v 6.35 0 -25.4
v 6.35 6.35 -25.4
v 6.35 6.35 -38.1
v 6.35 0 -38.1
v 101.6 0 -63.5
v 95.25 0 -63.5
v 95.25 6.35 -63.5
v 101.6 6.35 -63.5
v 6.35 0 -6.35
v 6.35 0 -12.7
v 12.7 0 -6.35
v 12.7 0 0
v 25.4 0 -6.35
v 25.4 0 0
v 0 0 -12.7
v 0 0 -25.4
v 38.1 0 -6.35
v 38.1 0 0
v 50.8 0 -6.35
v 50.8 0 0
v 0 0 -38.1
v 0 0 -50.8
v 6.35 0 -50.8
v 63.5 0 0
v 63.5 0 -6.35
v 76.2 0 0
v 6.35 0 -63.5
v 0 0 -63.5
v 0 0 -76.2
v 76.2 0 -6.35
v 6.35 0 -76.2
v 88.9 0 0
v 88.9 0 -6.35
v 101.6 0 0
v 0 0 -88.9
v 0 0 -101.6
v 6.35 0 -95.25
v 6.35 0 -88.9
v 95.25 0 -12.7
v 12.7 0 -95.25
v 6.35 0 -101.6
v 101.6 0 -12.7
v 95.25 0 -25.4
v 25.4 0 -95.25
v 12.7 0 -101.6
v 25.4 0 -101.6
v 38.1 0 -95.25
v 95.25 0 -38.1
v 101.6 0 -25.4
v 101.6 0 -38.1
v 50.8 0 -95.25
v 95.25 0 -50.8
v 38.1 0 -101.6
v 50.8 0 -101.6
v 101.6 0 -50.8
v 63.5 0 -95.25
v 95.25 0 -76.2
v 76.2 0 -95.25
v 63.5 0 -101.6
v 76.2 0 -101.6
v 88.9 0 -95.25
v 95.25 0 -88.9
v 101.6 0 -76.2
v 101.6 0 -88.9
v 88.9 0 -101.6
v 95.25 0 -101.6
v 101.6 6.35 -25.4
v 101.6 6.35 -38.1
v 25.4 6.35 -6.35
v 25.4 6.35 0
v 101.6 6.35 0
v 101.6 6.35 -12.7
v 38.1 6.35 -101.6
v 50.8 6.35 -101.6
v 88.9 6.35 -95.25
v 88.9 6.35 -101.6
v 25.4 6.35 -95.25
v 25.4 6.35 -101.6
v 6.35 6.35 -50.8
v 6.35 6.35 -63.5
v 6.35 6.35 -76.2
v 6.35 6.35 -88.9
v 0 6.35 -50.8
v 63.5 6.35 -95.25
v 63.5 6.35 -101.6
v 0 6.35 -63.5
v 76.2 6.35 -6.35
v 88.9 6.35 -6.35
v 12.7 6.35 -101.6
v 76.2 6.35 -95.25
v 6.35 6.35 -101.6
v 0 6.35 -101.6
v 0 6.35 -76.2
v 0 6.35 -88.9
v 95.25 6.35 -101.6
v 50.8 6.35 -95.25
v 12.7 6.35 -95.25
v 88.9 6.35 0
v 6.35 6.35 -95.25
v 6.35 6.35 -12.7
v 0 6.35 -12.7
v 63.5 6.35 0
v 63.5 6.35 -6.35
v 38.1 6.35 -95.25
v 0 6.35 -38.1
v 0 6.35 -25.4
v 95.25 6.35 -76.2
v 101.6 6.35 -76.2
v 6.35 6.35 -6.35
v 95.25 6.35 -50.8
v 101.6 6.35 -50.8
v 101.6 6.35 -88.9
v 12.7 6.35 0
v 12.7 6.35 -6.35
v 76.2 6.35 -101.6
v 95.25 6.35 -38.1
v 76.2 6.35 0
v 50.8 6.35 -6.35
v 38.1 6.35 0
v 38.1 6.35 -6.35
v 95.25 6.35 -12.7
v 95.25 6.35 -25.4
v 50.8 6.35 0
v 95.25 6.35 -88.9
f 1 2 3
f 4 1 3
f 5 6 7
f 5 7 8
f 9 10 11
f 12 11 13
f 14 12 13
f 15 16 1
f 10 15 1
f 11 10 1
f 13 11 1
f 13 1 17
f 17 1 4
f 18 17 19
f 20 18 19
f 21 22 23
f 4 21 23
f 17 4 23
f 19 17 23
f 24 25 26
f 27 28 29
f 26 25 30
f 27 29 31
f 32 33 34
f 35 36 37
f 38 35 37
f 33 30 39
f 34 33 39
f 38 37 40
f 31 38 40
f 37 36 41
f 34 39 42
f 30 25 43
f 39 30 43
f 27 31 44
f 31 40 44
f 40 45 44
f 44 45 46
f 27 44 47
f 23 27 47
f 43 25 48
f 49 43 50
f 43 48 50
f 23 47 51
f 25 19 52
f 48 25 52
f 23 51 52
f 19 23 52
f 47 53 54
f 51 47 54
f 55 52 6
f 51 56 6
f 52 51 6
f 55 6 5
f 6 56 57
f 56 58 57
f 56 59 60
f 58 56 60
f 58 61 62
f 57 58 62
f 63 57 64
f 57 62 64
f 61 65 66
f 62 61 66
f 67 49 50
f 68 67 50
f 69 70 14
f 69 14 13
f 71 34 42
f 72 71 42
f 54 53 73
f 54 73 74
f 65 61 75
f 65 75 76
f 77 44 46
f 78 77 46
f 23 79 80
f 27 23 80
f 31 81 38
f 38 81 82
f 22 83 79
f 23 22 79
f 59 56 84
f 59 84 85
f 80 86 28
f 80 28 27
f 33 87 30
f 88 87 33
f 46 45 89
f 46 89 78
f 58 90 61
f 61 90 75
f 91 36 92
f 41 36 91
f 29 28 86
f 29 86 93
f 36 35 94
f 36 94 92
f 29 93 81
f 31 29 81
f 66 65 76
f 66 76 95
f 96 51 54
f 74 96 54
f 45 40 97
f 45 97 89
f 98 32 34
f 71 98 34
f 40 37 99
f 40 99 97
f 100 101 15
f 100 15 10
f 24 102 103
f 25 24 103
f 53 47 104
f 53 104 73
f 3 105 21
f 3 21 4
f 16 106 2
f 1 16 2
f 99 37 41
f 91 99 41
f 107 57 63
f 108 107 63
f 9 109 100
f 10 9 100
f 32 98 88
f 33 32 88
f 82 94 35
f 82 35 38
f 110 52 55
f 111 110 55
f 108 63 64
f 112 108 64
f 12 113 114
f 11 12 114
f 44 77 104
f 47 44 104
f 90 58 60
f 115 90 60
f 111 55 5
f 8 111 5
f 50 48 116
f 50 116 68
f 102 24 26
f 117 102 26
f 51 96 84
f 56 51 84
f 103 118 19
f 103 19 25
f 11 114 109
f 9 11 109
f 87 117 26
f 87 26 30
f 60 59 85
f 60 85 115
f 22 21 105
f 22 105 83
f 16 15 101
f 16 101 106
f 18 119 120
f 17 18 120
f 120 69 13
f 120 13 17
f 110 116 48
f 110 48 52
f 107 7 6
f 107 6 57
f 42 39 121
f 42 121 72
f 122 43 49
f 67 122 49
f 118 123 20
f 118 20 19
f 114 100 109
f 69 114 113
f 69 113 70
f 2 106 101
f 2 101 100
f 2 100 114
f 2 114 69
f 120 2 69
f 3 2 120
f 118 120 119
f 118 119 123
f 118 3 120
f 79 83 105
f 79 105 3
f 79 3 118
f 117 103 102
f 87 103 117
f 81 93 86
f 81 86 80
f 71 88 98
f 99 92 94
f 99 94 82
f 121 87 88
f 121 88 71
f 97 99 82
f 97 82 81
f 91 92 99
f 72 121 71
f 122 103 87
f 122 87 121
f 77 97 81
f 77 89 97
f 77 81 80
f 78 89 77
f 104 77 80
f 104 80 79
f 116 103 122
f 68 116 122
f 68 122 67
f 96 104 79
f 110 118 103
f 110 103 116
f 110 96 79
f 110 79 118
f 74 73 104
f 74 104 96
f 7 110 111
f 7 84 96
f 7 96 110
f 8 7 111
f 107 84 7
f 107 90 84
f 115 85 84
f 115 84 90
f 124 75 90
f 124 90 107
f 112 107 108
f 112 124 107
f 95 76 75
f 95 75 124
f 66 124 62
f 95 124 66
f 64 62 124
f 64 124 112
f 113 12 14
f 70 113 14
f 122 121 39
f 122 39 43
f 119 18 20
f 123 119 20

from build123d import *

# Parameters (mm, degrees)
SKETCH1_W           = 101.6
SKETCH1_H           = 101.6
BOSS_EXTRUDE1_DEPTH = 6.35
SKETCH2_W           = 6.35
SKETCH2_H           = 12.7
SKETCH2_H_2         = 6.35
CUT_EXTRUDE1_DEPTH  = 144.824345992
SKETCH2_3_W         = 6.35
SKETCH2_3_H         = 6.35
SKETCH2_3_W_2       = 12.7
CUT_EXTRUDE2_DEPTH  = 6.35


with BuildPart() as part:
    # Sketch1 → Boss-Extrude1 (new body)
    with BuildSketch(Plane(origin=(0, 0, 0), x_dir=(1, 0, 0), z_dir=(0, 1, 0))):
        with Locations((50.8, 50.8)):
            Rectangle(SKETCH1_W, SKETCH1_H)
    extrude(amount=BOSS_EXTRUDE1_DEPTH)

    # Sketch2 → Cut-Extrude1 (cut, through all)
    with BuildSketch(Plane(origin=(0, 6.35, 0), x_dir=(1, 0, 0), z_dir=(0, 1, 0))):
        with Locations((3.175, 82.55)):
            Rectangle(SKETCH2_W, SKETCH2_H)
        with Locations((3.175, 57.15)):
            Rectangle(SKETCH2_W, SKETCH2_H)
        with Locations((3.175, 31.75)):
            Rectangle(SKETCH2_W, SKETCH2_H)
        with Locations((3.175, 9.525)):
            Rectangle(SKETCH2_W, SKETCH2_H_2)
        with Locations((98.425, 95.25)):
            Rectangle(SKETCH2_W, SKETCH2_H)
        with Locations((98.425, 69.85)):
            Rectangle(SKETCH2_W, SKETCH2_H)
        with Locations((98.425, 44.45)):
            Rectangle(SKETCH2_W, SKETCH2_H)
        with Locations((98.425, 19.05)):
            Rectangle(SKETCH2_W, SKETCH2_H)
    extrude(amount=-CUT_EXTRUDE1_DEPTH, mode=Mode.SUBTRACT)

    # Sketch2<3> → Cut-Extrude2 (cut)
    with BuildSketch(Plane(origin=(0, 6.35, 0), x_dir=(1, 0, 0), z_dir=(0, 1, 0))):
        with Locations((9.525, 98.425)):
            Rectangle(SKETCH2_3_W, SKETCH2_3_H)
        with Locations((31.75, 98.425)):
            Rectangle(SKETCH2_3_W_2, SKETCH2_3_H)
        with Locations((57.15, 98.425)):
            Rectangle(SKETCH2_3_W_2, SKETCH2_3_H)
        with Locations((6.35, 3.175)):
            Rectangle(SKETCH2_3_W_2, SKETCH2_3_H)
        with Locations((82.55, 98.425)):
            Rectangle(SKETCH2_3_W_2, SKETCH2_3_H)
        with Locations((31.75, 3.175)):
            Rectangle(SKETCH2_3_W_2, SKETCH2_3_H)
        with Locations((57.15, 3.175)):
            Rectangle(SKETCH2_3_W_2, SKETCH2_3_H)
        with Locations((82.55, 3.175)):
            Rectangle(SKETCH2_3_W_2, SKETCH2_3_H)
    extrude(amount=-CUT_EXTRUDE2_DEPTH, mode=Mode.SUBTRACT)


solid = part.part
